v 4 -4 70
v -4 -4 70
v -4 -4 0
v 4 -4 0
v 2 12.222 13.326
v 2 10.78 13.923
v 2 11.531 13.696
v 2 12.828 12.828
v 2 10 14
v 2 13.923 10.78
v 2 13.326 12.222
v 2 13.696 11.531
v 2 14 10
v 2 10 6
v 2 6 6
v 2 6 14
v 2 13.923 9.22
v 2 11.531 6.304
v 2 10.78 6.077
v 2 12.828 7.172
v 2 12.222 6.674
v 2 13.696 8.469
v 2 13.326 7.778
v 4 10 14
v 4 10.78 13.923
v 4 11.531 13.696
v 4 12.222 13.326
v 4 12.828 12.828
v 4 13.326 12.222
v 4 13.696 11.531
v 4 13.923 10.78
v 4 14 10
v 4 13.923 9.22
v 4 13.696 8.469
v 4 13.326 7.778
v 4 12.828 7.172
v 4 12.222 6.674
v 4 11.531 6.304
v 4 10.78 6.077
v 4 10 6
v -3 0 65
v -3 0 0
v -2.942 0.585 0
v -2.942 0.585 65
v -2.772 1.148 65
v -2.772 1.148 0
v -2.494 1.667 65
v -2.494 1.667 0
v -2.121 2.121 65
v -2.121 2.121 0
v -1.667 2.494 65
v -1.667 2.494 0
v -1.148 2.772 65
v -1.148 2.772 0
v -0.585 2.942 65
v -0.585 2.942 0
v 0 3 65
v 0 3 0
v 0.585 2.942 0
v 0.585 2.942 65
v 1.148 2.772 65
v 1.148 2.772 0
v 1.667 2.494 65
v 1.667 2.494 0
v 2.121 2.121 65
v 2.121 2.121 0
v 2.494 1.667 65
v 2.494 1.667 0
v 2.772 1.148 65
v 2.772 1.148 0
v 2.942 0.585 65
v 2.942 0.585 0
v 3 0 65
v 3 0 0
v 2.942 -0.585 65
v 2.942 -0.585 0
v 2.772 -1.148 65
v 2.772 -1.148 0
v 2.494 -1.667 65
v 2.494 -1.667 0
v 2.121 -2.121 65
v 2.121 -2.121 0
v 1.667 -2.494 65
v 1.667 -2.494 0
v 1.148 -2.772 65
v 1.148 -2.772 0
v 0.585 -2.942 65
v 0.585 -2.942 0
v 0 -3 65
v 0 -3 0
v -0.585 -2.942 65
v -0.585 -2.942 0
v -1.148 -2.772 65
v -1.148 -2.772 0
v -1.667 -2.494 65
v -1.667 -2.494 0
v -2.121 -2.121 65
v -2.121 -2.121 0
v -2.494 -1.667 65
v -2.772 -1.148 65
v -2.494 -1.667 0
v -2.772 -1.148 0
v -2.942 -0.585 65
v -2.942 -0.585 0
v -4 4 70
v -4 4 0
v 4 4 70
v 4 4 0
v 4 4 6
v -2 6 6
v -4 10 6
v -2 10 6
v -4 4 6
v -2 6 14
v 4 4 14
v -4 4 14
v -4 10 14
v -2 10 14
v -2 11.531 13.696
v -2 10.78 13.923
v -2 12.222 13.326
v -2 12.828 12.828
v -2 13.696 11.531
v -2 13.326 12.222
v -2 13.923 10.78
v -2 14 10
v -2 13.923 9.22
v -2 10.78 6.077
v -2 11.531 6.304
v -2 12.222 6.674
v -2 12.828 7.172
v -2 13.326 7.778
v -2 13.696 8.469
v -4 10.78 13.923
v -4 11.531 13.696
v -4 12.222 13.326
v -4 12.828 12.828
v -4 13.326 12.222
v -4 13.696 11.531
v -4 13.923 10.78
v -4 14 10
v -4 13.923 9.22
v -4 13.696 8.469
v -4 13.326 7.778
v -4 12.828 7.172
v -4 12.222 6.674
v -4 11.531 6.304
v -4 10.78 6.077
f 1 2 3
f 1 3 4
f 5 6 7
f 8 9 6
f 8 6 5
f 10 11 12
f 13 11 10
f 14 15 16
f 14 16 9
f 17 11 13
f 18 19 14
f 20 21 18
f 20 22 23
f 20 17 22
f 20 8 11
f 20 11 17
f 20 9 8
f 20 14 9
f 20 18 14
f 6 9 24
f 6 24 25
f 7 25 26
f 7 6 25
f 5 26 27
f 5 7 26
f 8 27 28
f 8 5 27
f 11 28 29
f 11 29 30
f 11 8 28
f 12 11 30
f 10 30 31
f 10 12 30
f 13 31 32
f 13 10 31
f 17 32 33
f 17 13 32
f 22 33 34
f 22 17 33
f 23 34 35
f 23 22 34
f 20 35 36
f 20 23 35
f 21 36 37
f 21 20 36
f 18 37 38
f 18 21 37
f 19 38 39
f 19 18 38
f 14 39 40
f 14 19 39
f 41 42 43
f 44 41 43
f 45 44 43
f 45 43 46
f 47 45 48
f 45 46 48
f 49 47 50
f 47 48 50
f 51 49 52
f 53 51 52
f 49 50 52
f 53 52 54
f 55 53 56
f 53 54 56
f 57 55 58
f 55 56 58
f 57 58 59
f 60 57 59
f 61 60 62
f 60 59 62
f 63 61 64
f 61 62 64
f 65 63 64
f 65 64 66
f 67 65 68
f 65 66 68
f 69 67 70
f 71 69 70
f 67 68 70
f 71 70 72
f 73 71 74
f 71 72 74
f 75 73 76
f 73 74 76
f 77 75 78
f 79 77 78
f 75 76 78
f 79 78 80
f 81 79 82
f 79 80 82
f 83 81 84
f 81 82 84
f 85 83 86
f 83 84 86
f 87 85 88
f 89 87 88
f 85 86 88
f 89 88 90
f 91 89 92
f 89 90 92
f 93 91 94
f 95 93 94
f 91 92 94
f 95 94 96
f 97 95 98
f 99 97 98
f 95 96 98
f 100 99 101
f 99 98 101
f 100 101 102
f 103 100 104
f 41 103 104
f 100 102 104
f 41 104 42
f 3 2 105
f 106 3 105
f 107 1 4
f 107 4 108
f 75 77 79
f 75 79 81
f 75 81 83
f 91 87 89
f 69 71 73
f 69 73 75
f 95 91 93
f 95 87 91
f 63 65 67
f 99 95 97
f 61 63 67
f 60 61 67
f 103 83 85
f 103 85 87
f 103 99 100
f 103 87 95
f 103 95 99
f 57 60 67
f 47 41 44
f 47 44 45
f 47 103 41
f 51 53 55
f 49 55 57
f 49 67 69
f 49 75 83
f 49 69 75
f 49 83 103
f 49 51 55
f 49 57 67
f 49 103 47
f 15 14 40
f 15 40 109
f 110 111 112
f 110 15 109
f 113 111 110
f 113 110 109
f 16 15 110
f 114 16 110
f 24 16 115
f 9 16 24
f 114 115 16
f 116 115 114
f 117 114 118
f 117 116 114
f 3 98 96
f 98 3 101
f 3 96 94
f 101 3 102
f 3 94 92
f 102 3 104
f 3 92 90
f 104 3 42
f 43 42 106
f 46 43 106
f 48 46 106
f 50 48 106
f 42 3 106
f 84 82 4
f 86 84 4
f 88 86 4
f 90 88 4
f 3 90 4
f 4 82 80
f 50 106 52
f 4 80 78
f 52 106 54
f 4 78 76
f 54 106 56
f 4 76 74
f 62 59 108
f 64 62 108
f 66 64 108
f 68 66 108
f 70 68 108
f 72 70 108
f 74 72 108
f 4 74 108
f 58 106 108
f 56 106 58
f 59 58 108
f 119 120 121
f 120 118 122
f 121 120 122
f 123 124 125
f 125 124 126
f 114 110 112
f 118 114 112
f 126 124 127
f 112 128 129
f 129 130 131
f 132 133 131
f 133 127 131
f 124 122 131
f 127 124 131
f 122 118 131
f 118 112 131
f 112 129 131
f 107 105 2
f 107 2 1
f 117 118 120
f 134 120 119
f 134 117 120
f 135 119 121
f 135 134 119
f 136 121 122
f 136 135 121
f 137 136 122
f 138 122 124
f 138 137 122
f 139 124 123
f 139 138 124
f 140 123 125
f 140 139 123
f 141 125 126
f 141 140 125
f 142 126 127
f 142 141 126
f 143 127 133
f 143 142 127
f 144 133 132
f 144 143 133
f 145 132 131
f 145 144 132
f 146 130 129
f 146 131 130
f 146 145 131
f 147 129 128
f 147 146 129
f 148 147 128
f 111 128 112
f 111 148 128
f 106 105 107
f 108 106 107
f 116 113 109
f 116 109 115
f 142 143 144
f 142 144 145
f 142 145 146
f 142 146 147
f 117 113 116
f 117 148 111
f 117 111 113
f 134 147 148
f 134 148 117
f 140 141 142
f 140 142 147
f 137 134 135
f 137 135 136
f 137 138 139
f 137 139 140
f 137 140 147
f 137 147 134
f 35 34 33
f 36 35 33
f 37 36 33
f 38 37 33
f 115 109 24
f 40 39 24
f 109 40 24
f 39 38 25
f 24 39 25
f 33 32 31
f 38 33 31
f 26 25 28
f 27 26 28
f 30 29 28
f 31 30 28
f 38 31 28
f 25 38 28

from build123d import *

# Parameters (mm, degrees)
SKETCH_1_W           = 8
SKETCH_1_H           = 8
EXTRUDE_1_DEPTH      = 70
SKETCH_2_R           = 3
CUT_EXTRUDE_1_DEPTH  = 65
EXTRUDE_2_DEPTH      = 8
SKETCH_8_W           = 4
SKETCH_8_H           = 8
CUT_EXTRUDE_10_DEPTH = 12


with BuildPart() as part:
    # 草图1 → 凸台-拉伸1 (new body)
    with BuildSketch(Plane.XY):
        Rectangle(SKETCH_1_W, SKETCH_1_H)
    extrude(amount=EXTRUDE_1_DEPTH)

    # 草图2 → 切除-拉伸1 (cut)
    with BuildSketch(Plane(origin=(0, 0, 0), x_dir=(-1, 0, 0), z_dir=(0, 0, -1))):
        Circle(SKETCH_2_R)
    extrude(amount=-CUT_EXTRUDE_1_DEPTH, mode=Mode.SUBTRACT)


with BuildPart() as body_2:
    # 草图3 → 凸台-拉伸2 (new body)
    with BuildSketch(Plane.ZY.offset(4)):
        with BuildLine():
            Line((6, 4), (14, 4))
            Line((14, 4), (14, 10))
            ThreePointArc((14, 10), (10, 14), (6, 10))
            Line((6, 10), (6, 4))
        make_face()
    extrude(amount=-EXTRUDE_2_DEPTH)

    # 草图8 → 切除-拉伸10 (cut)
    with BuildSketch(Plane(origin=(0, 0, 6), x_dir=(-1, 0, 0), z_dir=(0, 0, -1))):
        with Locations((0, 10)):
            Rectangle(SKETCH_8_W, SKETCH_8_H)
    extrude(amount=-CUT_EXTRUDE_10_DEPTH, mode=Mode.SUBTRACT)


solid = Compound([part.part, body_2.part])
